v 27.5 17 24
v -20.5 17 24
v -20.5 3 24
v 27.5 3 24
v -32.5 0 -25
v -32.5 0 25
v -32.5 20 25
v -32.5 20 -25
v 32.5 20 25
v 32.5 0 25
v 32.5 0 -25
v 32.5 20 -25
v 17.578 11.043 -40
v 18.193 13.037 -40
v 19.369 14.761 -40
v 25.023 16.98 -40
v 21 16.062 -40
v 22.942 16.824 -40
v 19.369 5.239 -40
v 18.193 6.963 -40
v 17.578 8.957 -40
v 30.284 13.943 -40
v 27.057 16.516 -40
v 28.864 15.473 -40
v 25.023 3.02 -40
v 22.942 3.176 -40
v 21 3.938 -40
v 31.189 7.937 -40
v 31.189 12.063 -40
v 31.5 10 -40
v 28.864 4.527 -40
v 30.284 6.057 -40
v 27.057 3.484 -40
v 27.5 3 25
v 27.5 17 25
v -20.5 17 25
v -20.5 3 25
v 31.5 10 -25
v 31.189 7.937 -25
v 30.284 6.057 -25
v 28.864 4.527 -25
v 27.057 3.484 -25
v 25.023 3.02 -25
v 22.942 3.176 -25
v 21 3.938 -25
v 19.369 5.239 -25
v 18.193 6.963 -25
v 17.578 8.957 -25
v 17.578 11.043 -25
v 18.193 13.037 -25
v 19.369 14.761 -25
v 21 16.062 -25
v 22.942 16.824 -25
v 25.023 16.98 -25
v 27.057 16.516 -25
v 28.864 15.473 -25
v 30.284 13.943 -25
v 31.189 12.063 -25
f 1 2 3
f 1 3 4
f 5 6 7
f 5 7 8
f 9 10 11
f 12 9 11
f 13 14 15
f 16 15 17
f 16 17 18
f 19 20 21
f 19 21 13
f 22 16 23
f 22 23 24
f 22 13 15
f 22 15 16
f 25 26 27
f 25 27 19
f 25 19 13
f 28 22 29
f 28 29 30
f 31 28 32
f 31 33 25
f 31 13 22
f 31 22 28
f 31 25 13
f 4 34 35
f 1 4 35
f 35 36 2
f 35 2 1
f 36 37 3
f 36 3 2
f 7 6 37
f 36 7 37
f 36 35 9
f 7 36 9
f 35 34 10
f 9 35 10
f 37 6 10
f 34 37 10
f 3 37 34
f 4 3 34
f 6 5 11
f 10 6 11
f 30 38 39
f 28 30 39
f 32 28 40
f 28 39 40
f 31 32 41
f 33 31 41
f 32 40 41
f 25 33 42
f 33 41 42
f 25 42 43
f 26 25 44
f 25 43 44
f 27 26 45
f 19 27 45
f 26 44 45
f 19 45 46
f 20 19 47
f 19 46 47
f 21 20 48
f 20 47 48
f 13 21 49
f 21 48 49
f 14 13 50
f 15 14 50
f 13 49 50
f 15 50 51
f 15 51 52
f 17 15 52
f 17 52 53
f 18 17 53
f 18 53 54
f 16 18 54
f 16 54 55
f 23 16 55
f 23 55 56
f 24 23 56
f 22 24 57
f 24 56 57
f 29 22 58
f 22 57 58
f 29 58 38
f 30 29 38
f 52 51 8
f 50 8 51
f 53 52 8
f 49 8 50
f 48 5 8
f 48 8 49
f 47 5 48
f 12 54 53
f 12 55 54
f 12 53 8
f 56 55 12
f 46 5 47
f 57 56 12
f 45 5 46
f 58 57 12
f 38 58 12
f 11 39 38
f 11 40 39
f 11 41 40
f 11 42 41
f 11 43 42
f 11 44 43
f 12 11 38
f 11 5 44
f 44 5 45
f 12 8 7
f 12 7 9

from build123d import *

# Parameters (mm, degrees)
SKETCH2_W           = 65
SKETCH2_H           = 50
BOSS_EXTRUDE1_DEPTH = 20
SKETCH3_R           = 7
BOSS_EXTRUDE2_DEPTH = 15
SKETCH4_W           = 48
SKETCH4_H           = 14
CUT_EXTRUDE1_DEPTH  = 1


with BuildPart() as part:
    # Sketch2 → Boss-Extrude1 (new body)
    with BuildSketch(Plane(origin=(0, 0, 0), x_dir=(1, 0, 0), z_dir=(0, 1, 0))):
        Rectangle(SKETCH2_W, SKETCH2_H)
    extrude(amount=BOSS_EXTRUDE1_DEPTH)

    # Sketch3 → Boss-Extrude2 (add)
    with BuildSketch(Plane(origin=(0, 0, -25), x_dir=(-1, 0, 0), z_dir=(0, 0, -1))):
        with Locations(Location((-24.5, 10, 0), (0, 0, 180))):
            Circle(SKETCH3_R)
    extrude(amount=BOSS_EXTRUDE2_DEPTH)

    # Sketch4 → Cut-Extrude1 (cut)
    with BuildSketch(Plane.XY.offset(25)):
        with Locations((3.5, 10)):
            Rectangle(SKETCH4_W, SKETCH4_H)
    extrude(amount=-CUT_EXTRUDE1_DEPTH, mode=Mode.SUBTRACT)


solid = part.part
